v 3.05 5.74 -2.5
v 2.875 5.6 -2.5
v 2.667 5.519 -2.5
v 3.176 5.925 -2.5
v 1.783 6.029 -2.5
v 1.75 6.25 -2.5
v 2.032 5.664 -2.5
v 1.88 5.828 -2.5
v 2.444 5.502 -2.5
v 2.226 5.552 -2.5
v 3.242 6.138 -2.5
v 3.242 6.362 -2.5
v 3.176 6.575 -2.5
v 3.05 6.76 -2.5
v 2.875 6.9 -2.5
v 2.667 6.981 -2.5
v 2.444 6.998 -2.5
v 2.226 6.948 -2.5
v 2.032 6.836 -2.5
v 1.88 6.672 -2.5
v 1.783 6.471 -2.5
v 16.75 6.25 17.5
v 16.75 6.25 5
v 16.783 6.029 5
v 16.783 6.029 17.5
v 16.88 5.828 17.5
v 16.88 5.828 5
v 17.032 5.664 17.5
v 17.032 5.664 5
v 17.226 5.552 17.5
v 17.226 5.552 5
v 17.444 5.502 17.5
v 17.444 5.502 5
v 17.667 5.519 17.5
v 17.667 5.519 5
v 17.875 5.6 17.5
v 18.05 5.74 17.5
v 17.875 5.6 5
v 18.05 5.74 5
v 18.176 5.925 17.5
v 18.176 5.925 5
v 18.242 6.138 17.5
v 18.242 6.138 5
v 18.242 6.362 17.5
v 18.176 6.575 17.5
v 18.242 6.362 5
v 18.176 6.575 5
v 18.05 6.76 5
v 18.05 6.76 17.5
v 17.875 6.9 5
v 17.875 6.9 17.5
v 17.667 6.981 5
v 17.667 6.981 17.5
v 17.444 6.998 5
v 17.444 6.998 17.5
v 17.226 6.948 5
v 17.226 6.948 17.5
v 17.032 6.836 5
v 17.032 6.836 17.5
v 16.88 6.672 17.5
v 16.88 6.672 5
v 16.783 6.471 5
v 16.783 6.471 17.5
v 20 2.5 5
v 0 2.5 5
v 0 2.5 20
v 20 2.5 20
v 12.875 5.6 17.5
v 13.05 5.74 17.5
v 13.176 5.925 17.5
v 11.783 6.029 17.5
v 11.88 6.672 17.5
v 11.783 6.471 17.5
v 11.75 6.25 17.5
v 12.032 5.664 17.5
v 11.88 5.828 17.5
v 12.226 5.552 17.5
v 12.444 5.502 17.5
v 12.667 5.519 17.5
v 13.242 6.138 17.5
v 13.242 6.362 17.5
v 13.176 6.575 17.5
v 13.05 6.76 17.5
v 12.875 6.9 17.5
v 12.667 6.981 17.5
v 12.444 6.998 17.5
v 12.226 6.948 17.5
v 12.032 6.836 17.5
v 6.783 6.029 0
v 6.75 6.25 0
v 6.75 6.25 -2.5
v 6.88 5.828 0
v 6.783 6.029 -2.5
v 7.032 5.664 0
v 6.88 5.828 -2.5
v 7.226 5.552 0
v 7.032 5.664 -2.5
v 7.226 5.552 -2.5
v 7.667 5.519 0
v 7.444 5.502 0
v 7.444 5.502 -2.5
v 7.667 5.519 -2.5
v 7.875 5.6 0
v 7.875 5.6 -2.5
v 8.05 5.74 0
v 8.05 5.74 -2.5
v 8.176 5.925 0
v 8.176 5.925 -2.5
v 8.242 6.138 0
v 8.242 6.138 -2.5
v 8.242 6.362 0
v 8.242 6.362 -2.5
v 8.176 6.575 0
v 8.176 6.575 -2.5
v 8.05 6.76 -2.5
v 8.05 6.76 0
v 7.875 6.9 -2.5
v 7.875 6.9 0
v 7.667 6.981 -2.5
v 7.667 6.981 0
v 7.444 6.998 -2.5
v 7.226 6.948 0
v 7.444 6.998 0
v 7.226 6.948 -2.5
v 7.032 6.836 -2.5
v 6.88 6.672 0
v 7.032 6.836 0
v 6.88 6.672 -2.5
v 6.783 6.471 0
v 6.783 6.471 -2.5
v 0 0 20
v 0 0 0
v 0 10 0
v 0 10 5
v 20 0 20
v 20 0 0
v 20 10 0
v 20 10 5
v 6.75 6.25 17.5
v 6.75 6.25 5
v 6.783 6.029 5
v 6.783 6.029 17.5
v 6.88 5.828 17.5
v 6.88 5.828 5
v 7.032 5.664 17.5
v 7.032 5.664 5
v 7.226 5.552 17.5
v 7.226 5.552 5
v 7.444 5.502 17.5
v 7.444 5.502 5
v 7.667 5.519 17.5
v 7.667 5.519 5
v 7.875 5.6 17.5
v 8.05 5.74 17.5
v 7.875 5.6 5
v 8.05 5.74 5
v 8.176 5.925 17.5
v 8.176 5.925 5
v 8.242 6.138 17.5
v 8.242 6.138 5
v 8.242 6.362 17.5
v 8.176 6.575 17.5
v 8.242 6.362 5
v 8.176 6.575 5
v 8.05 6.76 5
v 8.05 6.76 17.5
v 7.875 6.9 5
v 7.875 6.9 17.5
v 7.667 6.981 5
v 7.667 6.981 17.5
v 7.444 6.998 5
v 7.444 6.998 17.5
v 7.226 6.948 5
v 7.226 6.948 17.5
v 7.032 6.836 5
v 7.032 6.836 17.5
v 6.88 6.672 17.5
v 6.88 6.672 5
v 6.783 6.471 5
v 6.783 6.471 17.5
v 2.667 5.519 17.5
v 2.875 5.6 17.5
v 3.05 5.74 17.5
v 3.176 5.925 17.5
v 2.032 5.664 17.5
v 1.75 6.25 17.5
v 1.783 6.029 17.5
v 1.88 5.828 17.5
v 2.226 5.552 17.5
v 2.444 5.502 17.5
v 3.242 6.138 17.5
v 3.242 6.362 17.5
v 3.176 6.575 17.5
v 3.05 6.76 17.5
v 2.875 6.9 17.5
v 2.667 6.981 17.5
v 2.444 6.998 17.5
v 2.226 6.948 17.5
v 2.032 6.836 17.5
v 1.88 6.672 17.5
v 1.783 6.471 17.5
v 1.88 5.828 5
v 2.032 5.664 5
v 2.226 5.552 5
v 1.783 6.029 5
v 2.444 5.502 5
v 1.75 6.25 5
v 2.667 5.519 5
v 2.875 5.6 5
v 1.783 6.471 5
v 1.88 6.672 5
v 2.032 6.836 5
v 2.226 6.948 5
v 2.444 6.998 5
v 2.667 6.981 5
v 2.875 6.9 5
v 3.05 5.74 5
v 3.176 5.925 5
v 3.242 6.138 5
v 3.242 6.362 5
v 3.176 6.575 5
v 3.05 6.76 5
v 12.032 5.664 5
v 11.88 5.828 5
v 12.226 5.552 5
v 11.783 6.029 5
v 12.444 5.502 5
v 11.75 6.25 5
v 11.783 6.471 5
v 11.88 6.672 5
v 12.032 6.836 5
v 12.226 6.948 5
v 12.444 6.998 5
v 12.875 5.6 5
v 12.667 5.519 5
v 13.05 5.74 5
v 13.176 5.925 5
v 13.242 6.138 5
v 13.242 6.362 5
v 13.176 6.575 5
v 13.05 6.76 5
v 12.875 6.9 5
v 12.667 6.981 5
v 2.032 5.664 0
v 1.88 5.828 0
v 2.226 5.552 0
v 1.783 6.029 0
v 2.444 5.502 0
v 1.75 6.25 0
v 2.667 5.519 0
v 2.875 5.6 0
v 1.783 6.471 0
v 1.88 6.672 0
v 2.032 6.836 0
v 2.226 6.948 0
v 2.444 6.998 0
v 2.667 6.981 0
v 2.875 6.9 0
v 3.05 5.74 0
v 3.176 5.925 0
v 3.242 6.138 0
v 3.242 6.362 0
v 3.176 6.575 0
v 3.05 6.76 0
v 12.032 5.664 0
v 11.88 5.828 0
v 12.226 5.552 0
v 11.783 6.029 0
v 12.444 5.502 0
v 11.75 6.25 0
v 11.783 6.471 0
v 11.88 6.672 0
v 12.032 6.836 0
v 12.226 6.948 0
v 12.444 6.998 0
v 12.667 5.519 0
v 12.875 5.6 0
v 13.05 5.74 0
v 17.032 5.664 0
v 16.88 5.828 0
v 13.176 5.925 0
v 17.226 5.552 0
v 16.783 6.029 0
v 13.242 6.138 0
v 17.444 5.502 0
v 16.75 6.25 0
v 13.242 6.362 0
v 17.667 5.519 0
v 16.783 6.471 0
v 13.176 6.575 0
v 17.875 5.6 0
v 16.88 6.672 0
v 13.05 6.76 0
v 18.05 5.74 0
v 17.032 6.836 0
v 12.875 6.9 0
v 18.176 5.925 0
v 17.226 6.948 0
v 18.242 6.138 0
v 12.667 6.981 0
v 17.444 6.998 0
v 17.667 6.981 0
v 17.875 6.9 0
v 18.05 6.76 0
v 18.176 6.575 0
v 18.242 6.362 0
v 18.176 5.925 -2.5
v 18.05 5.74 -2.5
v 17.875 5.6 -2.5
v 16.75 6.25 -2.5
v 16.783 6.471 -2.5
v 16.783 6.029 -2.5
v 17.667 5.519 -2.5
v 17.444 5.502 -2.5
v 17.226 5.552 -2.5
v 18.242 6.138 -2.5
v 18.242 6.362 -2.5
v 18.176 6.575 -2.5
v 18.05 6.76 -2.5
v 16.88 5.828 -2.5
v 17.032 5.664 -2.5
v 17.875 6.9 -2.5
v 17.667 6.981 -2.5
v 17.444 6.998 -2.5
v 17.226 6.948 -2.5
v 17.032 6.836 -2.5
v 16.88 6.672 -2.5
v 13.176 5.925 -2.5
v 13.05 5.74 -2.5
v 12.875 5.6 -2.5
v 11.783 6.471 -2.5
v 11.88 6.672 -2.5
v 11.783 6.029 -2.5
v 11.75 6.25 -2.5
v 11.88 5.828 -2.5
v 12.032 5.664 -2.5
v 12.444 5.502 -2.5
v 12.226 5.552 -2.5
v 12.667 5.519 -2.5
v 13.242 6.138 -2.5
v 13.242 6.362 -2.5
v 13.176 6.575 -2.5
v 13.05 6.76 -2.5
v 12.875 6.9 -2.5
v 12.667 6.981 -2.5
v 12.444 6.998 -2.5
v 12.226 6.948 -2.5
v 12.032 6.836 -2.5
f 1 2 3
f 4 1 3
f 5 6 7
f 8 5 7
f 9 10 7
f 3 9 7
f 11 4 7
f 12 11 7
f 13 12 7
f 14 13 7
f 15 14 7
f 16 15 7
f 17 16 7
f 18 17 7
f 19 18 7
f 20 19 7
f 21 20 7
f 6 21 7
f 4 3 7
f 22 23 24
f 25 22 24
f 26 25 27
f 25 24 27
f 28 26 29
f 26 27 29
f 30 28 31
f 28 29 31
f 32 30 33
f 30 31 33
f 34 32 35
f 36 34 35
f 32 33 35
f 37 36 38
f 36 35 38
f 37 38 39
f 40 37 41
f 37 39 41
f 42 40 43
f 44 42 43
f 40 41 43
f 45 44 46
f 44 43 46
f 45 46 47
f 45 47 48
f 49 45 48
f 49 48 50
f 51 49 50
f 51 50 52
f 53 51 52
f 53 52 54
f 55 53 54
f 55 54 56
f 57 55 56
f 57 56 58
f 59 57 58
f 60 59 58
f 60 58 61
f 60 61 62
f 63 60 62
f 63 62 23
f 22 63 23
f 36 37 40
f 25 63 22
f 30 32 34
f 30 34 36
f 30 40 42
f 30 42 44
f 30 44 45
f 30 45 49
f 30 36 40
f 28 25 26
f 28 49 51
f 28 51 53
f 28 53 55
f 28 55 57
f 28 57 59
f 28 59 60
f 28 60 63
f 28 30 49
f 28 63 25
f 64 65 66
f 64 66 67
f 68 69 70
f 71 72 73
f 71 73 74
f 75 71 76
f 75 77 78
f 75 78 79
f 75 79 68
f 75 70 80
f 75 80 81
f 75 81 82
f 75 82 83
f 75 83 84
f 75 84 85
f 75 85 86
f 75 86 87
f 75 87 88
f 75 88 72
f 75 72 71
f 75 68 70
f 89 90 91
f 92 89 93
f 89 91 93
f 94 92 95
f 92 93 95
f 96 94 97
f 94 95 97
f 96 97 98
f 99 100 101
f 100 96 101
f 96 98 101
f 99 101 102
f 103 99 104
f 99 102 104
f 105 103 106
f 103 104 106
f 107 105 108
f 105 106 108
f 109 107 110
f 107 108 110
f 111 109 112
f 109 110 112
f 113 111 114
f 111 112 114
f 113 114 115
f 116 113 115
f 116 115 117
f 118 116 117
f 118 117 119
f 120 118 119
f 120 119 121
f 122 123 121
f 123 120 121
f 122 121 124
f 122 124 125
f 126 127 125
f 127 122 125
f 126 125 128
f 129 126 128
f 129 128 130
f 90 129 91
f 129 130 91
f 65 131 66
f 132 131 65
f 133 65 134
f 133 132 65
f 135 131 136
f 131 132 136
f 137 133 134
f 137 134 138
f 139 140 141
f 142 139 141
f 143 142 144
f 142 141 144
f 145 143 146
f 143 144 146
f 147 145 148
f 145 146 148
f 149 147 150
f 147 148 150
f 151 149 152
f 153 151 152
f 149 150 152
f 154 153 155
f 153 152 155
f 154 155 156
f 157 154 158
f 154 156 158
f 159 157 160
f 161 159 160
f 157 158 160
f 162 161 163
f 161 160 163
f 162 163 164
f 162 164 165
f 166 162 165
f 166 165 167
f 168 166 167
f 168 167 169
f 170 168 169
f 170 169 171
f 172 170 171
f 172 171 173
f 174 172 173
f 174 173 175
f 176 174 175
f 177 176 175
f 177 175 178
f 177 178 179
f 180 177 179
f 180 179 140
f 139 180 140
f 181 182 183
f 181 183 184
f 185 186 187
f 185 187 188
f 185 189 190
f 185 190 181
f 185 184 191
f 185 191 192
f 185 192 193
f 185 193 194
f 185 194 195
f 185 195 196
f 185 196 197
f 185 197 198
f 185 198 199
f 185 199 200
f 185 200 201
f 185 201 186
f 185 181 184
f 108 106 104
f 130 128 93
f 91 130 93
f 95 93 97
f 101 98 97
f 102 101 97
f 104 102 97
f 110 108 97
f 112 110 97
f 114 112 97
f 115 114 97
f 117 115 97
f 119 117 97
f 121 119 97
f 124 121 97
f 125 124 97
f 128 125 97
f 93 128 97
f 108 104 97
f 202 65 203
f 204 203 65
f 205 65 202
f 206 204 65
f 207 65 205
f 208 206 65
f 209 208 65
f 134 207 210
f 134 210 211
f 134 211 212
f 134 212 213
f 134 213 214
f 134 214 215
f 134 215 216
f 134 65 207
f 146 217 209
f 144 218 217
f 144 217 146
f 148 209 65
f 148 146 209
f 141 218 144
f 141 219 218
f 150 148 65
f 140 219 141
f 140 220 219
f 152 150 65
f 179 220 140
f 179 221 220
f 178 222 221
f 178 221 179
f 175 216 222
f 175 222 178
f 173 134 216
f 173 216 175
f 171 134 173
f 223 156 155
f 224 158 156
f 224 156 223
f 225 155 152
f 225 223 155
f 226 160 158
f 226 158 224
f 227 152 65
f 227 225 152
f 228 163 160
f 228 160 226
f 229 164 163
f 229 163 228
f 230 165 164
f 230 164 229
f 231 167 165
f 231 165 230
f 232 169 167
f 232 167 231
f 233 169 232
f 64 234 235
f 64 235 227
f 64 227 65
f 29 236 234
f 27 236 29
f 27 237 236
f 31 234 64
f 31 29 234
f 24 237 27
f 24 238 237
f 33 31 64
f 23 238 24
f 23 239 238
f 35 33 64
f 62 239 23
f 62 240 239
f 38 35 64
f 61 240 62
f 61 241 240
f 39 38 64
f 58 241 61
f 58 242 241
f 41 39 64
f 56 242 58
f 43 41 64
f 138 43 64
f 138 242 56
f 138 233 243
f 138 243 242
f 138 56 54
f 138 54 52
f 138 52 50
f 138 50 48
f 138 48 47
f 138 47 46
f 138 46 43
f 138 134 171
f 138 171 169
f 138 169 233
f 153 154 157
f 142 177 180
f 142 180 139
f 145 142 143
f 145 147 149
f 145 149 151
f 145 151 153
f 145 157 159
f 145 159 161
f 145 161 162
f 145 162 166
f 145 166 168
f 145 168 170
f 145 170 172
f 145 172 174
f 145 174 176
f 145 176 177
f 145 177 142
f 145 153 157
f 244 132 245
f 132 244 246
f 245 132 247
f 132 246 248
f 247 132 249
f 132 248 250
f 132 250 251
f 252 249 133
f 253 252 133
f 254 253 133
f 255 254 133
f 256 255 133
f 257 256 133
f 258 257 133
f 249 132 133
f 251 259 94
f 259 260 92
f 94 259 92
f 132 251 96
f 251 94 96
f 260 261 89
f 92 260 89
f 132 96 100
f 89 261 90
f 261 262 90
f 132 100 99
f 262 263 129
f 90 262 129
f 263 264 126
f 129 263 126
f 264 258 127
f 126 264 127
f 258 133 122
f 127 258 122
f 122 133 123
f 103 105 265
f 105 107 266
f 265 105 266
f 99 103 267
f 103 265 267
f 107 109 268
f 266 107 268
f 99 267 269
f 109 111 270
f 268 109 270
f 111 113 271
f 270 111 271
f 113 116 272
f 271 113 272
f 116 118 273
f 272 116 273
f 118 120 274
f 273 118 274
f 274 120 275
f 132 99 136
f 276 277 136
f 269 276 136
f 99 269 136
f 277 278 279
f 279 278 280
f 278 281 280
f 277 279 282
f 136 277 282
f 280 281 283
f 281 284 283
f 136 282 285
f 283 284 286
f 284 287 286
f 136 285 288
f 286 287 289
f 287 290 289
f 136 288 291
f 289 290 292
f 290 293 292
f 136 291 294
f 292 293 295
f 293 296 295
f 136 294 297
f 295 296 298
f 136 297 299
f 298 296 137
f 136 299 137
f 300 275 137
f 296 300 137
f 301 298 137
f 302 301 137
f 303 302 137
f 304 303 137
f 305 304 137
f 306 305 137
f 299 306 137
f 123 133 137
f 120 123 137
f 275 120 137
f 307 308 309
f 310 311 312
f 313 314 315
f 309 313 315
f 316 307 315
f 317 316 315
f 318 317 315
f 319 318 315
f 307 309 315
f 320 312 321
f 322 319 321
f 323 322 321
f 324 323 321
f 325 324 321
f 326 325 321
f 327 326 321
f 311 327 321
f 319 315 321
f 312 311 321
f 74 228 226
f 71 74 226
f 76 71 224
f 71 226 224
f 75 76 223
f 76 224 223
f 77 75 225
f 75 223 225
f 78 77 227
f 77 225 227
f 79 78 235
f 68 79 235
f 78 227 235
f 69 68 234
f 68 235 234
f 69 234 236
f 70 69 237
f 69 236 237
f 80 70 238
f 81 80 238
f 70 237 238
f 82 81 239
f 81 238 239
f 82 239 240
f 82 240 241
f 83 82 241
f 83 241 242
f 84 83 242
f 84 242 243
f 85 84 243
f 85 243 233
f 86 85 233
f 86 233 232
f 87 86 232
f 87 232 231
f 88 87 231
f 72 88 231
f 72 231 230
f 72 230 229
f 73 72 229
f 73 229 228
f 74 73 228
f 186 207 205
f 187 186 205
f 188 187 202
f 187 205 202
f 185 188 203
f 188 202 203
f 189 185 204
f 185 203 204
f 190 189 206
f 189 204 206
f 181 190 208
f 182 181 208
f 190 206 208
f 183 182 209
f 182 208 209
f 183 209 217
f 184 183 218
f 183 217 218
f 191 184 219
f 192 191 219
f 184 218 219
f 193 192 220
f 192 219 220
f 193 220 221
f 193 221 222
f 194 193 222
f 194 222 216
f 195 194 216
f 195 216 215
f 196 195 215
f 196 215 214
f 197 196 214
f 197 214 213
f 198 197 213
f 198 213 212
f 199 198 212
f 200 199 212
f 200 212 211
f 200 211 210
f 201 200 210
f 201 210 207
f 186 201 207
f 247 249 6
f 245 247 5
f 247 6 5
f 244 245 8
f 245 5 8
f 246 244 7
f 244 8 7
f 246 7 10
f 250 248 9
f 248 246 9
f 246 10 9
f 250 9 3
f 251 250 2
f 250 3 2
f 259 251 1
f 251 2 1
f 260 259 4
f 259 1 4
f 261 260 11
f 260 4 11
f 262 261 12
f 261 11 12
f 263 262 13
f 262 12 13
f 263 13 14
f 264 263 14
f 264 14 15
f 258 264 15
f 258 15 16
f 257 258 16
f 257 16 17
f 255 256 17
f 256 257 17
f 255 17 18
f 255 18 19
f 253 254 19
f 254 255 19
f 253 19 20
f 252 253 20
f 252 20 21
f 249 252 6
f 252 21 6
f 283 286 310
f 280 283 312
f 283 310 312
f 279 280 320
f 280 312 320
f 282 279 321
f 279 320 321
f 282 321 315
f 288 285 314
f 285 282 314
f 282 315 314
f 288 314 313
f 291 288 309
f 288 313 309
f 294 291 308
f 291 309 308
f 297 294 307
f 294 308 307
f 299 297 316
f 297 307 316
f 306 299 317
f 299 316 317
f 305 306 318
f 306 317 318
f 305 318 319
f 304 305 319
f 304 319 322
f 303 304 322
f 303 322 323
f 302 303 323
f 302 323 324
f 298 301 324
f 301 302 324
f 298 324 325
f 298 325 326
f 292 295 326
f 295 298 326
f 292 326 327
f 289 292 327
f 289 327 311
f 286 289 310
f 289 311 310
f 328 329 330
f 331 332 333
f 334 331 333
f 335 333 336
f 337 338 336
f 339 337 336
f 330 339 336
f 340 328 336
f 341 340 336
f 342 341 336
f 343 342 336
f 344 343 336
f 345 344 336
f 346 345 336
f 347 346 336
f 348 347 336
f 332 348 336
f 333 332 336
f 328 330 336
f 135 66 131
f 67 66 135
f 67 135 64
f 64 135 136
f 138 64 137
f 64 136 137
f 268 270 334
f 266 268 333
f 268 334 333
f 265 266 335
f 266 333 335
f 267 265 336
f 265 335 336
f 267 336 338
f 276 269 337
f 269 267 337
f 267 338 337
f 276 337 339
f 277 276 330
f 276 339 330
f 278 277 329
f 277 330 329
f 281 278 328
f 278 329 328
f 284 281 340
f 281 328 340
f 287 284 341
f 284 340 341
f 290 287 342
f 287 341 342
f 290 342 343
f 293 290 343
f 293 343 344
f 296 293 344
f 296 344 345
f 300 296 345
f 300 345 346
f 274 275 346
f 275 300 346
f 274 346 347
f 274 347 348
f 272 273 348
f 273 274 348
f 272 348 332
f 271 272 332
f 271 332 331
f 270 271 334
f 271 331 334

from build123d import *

# Parameters (mm, degrees)
SKETCH_1_W           = 20
SKETCH_1_H           = 10
EXTRUDE_1_DEPTH      = 5
SKETCH_2_W           = 20
SKETCH_2_H           = 2.5
EXTRUDE_2_DEPTH      = 15
EXTRUDE_3_DEPTH      = 12.5
EXTRUDE_3_DEPTH_BACK = 7.5
SKETCH_3_R           = 0.75


with BuildPart() as part:
    # Эскиз1 → Вытянуть1 (new body)
    with BuildSketch(Plane.XY):
        with Locations((10, 5)):
            Rectangle(SKETCH_1_W, SKETCH_1_H)
    extrude(amount=EXTRUDE_1_DEPTH)

    # Эскиз2 → Вытянуть2 (add)
    with BuildSketch(Plane.XY.offset(5)):
        with Locations((10, 1.25)):
            Rectangle(SKETCH_2_W, SKETCH_2_H)
    extrude(amount=EXTRUDE_2_DEPTH)

    # Эскиз3 → Вытянуть3 (add, two sides: drawn at the far end of the back side and taken through both)
    with BuildSketch(Plane.XY.offset(5).offset(-EXTRUDE_3_DEPTH_BACK)):
        with Locations((12.5, 6.25)):
            Circle(SKETCH_3_R)
        with Locations((17.5, 6.25)):
            Circle(SKETCH_3_R)
        with Locations((2.5, 6.25)):
            Circle(SKETCH_3_R)
        with Locations((7.5, 6.25)):
            Circle(SKETCH_3_R)
    extrude(amount=EXTRUDE_3_DEPTH + EXTRUDE_3_DEPTH_BACK)


solid = part.part
